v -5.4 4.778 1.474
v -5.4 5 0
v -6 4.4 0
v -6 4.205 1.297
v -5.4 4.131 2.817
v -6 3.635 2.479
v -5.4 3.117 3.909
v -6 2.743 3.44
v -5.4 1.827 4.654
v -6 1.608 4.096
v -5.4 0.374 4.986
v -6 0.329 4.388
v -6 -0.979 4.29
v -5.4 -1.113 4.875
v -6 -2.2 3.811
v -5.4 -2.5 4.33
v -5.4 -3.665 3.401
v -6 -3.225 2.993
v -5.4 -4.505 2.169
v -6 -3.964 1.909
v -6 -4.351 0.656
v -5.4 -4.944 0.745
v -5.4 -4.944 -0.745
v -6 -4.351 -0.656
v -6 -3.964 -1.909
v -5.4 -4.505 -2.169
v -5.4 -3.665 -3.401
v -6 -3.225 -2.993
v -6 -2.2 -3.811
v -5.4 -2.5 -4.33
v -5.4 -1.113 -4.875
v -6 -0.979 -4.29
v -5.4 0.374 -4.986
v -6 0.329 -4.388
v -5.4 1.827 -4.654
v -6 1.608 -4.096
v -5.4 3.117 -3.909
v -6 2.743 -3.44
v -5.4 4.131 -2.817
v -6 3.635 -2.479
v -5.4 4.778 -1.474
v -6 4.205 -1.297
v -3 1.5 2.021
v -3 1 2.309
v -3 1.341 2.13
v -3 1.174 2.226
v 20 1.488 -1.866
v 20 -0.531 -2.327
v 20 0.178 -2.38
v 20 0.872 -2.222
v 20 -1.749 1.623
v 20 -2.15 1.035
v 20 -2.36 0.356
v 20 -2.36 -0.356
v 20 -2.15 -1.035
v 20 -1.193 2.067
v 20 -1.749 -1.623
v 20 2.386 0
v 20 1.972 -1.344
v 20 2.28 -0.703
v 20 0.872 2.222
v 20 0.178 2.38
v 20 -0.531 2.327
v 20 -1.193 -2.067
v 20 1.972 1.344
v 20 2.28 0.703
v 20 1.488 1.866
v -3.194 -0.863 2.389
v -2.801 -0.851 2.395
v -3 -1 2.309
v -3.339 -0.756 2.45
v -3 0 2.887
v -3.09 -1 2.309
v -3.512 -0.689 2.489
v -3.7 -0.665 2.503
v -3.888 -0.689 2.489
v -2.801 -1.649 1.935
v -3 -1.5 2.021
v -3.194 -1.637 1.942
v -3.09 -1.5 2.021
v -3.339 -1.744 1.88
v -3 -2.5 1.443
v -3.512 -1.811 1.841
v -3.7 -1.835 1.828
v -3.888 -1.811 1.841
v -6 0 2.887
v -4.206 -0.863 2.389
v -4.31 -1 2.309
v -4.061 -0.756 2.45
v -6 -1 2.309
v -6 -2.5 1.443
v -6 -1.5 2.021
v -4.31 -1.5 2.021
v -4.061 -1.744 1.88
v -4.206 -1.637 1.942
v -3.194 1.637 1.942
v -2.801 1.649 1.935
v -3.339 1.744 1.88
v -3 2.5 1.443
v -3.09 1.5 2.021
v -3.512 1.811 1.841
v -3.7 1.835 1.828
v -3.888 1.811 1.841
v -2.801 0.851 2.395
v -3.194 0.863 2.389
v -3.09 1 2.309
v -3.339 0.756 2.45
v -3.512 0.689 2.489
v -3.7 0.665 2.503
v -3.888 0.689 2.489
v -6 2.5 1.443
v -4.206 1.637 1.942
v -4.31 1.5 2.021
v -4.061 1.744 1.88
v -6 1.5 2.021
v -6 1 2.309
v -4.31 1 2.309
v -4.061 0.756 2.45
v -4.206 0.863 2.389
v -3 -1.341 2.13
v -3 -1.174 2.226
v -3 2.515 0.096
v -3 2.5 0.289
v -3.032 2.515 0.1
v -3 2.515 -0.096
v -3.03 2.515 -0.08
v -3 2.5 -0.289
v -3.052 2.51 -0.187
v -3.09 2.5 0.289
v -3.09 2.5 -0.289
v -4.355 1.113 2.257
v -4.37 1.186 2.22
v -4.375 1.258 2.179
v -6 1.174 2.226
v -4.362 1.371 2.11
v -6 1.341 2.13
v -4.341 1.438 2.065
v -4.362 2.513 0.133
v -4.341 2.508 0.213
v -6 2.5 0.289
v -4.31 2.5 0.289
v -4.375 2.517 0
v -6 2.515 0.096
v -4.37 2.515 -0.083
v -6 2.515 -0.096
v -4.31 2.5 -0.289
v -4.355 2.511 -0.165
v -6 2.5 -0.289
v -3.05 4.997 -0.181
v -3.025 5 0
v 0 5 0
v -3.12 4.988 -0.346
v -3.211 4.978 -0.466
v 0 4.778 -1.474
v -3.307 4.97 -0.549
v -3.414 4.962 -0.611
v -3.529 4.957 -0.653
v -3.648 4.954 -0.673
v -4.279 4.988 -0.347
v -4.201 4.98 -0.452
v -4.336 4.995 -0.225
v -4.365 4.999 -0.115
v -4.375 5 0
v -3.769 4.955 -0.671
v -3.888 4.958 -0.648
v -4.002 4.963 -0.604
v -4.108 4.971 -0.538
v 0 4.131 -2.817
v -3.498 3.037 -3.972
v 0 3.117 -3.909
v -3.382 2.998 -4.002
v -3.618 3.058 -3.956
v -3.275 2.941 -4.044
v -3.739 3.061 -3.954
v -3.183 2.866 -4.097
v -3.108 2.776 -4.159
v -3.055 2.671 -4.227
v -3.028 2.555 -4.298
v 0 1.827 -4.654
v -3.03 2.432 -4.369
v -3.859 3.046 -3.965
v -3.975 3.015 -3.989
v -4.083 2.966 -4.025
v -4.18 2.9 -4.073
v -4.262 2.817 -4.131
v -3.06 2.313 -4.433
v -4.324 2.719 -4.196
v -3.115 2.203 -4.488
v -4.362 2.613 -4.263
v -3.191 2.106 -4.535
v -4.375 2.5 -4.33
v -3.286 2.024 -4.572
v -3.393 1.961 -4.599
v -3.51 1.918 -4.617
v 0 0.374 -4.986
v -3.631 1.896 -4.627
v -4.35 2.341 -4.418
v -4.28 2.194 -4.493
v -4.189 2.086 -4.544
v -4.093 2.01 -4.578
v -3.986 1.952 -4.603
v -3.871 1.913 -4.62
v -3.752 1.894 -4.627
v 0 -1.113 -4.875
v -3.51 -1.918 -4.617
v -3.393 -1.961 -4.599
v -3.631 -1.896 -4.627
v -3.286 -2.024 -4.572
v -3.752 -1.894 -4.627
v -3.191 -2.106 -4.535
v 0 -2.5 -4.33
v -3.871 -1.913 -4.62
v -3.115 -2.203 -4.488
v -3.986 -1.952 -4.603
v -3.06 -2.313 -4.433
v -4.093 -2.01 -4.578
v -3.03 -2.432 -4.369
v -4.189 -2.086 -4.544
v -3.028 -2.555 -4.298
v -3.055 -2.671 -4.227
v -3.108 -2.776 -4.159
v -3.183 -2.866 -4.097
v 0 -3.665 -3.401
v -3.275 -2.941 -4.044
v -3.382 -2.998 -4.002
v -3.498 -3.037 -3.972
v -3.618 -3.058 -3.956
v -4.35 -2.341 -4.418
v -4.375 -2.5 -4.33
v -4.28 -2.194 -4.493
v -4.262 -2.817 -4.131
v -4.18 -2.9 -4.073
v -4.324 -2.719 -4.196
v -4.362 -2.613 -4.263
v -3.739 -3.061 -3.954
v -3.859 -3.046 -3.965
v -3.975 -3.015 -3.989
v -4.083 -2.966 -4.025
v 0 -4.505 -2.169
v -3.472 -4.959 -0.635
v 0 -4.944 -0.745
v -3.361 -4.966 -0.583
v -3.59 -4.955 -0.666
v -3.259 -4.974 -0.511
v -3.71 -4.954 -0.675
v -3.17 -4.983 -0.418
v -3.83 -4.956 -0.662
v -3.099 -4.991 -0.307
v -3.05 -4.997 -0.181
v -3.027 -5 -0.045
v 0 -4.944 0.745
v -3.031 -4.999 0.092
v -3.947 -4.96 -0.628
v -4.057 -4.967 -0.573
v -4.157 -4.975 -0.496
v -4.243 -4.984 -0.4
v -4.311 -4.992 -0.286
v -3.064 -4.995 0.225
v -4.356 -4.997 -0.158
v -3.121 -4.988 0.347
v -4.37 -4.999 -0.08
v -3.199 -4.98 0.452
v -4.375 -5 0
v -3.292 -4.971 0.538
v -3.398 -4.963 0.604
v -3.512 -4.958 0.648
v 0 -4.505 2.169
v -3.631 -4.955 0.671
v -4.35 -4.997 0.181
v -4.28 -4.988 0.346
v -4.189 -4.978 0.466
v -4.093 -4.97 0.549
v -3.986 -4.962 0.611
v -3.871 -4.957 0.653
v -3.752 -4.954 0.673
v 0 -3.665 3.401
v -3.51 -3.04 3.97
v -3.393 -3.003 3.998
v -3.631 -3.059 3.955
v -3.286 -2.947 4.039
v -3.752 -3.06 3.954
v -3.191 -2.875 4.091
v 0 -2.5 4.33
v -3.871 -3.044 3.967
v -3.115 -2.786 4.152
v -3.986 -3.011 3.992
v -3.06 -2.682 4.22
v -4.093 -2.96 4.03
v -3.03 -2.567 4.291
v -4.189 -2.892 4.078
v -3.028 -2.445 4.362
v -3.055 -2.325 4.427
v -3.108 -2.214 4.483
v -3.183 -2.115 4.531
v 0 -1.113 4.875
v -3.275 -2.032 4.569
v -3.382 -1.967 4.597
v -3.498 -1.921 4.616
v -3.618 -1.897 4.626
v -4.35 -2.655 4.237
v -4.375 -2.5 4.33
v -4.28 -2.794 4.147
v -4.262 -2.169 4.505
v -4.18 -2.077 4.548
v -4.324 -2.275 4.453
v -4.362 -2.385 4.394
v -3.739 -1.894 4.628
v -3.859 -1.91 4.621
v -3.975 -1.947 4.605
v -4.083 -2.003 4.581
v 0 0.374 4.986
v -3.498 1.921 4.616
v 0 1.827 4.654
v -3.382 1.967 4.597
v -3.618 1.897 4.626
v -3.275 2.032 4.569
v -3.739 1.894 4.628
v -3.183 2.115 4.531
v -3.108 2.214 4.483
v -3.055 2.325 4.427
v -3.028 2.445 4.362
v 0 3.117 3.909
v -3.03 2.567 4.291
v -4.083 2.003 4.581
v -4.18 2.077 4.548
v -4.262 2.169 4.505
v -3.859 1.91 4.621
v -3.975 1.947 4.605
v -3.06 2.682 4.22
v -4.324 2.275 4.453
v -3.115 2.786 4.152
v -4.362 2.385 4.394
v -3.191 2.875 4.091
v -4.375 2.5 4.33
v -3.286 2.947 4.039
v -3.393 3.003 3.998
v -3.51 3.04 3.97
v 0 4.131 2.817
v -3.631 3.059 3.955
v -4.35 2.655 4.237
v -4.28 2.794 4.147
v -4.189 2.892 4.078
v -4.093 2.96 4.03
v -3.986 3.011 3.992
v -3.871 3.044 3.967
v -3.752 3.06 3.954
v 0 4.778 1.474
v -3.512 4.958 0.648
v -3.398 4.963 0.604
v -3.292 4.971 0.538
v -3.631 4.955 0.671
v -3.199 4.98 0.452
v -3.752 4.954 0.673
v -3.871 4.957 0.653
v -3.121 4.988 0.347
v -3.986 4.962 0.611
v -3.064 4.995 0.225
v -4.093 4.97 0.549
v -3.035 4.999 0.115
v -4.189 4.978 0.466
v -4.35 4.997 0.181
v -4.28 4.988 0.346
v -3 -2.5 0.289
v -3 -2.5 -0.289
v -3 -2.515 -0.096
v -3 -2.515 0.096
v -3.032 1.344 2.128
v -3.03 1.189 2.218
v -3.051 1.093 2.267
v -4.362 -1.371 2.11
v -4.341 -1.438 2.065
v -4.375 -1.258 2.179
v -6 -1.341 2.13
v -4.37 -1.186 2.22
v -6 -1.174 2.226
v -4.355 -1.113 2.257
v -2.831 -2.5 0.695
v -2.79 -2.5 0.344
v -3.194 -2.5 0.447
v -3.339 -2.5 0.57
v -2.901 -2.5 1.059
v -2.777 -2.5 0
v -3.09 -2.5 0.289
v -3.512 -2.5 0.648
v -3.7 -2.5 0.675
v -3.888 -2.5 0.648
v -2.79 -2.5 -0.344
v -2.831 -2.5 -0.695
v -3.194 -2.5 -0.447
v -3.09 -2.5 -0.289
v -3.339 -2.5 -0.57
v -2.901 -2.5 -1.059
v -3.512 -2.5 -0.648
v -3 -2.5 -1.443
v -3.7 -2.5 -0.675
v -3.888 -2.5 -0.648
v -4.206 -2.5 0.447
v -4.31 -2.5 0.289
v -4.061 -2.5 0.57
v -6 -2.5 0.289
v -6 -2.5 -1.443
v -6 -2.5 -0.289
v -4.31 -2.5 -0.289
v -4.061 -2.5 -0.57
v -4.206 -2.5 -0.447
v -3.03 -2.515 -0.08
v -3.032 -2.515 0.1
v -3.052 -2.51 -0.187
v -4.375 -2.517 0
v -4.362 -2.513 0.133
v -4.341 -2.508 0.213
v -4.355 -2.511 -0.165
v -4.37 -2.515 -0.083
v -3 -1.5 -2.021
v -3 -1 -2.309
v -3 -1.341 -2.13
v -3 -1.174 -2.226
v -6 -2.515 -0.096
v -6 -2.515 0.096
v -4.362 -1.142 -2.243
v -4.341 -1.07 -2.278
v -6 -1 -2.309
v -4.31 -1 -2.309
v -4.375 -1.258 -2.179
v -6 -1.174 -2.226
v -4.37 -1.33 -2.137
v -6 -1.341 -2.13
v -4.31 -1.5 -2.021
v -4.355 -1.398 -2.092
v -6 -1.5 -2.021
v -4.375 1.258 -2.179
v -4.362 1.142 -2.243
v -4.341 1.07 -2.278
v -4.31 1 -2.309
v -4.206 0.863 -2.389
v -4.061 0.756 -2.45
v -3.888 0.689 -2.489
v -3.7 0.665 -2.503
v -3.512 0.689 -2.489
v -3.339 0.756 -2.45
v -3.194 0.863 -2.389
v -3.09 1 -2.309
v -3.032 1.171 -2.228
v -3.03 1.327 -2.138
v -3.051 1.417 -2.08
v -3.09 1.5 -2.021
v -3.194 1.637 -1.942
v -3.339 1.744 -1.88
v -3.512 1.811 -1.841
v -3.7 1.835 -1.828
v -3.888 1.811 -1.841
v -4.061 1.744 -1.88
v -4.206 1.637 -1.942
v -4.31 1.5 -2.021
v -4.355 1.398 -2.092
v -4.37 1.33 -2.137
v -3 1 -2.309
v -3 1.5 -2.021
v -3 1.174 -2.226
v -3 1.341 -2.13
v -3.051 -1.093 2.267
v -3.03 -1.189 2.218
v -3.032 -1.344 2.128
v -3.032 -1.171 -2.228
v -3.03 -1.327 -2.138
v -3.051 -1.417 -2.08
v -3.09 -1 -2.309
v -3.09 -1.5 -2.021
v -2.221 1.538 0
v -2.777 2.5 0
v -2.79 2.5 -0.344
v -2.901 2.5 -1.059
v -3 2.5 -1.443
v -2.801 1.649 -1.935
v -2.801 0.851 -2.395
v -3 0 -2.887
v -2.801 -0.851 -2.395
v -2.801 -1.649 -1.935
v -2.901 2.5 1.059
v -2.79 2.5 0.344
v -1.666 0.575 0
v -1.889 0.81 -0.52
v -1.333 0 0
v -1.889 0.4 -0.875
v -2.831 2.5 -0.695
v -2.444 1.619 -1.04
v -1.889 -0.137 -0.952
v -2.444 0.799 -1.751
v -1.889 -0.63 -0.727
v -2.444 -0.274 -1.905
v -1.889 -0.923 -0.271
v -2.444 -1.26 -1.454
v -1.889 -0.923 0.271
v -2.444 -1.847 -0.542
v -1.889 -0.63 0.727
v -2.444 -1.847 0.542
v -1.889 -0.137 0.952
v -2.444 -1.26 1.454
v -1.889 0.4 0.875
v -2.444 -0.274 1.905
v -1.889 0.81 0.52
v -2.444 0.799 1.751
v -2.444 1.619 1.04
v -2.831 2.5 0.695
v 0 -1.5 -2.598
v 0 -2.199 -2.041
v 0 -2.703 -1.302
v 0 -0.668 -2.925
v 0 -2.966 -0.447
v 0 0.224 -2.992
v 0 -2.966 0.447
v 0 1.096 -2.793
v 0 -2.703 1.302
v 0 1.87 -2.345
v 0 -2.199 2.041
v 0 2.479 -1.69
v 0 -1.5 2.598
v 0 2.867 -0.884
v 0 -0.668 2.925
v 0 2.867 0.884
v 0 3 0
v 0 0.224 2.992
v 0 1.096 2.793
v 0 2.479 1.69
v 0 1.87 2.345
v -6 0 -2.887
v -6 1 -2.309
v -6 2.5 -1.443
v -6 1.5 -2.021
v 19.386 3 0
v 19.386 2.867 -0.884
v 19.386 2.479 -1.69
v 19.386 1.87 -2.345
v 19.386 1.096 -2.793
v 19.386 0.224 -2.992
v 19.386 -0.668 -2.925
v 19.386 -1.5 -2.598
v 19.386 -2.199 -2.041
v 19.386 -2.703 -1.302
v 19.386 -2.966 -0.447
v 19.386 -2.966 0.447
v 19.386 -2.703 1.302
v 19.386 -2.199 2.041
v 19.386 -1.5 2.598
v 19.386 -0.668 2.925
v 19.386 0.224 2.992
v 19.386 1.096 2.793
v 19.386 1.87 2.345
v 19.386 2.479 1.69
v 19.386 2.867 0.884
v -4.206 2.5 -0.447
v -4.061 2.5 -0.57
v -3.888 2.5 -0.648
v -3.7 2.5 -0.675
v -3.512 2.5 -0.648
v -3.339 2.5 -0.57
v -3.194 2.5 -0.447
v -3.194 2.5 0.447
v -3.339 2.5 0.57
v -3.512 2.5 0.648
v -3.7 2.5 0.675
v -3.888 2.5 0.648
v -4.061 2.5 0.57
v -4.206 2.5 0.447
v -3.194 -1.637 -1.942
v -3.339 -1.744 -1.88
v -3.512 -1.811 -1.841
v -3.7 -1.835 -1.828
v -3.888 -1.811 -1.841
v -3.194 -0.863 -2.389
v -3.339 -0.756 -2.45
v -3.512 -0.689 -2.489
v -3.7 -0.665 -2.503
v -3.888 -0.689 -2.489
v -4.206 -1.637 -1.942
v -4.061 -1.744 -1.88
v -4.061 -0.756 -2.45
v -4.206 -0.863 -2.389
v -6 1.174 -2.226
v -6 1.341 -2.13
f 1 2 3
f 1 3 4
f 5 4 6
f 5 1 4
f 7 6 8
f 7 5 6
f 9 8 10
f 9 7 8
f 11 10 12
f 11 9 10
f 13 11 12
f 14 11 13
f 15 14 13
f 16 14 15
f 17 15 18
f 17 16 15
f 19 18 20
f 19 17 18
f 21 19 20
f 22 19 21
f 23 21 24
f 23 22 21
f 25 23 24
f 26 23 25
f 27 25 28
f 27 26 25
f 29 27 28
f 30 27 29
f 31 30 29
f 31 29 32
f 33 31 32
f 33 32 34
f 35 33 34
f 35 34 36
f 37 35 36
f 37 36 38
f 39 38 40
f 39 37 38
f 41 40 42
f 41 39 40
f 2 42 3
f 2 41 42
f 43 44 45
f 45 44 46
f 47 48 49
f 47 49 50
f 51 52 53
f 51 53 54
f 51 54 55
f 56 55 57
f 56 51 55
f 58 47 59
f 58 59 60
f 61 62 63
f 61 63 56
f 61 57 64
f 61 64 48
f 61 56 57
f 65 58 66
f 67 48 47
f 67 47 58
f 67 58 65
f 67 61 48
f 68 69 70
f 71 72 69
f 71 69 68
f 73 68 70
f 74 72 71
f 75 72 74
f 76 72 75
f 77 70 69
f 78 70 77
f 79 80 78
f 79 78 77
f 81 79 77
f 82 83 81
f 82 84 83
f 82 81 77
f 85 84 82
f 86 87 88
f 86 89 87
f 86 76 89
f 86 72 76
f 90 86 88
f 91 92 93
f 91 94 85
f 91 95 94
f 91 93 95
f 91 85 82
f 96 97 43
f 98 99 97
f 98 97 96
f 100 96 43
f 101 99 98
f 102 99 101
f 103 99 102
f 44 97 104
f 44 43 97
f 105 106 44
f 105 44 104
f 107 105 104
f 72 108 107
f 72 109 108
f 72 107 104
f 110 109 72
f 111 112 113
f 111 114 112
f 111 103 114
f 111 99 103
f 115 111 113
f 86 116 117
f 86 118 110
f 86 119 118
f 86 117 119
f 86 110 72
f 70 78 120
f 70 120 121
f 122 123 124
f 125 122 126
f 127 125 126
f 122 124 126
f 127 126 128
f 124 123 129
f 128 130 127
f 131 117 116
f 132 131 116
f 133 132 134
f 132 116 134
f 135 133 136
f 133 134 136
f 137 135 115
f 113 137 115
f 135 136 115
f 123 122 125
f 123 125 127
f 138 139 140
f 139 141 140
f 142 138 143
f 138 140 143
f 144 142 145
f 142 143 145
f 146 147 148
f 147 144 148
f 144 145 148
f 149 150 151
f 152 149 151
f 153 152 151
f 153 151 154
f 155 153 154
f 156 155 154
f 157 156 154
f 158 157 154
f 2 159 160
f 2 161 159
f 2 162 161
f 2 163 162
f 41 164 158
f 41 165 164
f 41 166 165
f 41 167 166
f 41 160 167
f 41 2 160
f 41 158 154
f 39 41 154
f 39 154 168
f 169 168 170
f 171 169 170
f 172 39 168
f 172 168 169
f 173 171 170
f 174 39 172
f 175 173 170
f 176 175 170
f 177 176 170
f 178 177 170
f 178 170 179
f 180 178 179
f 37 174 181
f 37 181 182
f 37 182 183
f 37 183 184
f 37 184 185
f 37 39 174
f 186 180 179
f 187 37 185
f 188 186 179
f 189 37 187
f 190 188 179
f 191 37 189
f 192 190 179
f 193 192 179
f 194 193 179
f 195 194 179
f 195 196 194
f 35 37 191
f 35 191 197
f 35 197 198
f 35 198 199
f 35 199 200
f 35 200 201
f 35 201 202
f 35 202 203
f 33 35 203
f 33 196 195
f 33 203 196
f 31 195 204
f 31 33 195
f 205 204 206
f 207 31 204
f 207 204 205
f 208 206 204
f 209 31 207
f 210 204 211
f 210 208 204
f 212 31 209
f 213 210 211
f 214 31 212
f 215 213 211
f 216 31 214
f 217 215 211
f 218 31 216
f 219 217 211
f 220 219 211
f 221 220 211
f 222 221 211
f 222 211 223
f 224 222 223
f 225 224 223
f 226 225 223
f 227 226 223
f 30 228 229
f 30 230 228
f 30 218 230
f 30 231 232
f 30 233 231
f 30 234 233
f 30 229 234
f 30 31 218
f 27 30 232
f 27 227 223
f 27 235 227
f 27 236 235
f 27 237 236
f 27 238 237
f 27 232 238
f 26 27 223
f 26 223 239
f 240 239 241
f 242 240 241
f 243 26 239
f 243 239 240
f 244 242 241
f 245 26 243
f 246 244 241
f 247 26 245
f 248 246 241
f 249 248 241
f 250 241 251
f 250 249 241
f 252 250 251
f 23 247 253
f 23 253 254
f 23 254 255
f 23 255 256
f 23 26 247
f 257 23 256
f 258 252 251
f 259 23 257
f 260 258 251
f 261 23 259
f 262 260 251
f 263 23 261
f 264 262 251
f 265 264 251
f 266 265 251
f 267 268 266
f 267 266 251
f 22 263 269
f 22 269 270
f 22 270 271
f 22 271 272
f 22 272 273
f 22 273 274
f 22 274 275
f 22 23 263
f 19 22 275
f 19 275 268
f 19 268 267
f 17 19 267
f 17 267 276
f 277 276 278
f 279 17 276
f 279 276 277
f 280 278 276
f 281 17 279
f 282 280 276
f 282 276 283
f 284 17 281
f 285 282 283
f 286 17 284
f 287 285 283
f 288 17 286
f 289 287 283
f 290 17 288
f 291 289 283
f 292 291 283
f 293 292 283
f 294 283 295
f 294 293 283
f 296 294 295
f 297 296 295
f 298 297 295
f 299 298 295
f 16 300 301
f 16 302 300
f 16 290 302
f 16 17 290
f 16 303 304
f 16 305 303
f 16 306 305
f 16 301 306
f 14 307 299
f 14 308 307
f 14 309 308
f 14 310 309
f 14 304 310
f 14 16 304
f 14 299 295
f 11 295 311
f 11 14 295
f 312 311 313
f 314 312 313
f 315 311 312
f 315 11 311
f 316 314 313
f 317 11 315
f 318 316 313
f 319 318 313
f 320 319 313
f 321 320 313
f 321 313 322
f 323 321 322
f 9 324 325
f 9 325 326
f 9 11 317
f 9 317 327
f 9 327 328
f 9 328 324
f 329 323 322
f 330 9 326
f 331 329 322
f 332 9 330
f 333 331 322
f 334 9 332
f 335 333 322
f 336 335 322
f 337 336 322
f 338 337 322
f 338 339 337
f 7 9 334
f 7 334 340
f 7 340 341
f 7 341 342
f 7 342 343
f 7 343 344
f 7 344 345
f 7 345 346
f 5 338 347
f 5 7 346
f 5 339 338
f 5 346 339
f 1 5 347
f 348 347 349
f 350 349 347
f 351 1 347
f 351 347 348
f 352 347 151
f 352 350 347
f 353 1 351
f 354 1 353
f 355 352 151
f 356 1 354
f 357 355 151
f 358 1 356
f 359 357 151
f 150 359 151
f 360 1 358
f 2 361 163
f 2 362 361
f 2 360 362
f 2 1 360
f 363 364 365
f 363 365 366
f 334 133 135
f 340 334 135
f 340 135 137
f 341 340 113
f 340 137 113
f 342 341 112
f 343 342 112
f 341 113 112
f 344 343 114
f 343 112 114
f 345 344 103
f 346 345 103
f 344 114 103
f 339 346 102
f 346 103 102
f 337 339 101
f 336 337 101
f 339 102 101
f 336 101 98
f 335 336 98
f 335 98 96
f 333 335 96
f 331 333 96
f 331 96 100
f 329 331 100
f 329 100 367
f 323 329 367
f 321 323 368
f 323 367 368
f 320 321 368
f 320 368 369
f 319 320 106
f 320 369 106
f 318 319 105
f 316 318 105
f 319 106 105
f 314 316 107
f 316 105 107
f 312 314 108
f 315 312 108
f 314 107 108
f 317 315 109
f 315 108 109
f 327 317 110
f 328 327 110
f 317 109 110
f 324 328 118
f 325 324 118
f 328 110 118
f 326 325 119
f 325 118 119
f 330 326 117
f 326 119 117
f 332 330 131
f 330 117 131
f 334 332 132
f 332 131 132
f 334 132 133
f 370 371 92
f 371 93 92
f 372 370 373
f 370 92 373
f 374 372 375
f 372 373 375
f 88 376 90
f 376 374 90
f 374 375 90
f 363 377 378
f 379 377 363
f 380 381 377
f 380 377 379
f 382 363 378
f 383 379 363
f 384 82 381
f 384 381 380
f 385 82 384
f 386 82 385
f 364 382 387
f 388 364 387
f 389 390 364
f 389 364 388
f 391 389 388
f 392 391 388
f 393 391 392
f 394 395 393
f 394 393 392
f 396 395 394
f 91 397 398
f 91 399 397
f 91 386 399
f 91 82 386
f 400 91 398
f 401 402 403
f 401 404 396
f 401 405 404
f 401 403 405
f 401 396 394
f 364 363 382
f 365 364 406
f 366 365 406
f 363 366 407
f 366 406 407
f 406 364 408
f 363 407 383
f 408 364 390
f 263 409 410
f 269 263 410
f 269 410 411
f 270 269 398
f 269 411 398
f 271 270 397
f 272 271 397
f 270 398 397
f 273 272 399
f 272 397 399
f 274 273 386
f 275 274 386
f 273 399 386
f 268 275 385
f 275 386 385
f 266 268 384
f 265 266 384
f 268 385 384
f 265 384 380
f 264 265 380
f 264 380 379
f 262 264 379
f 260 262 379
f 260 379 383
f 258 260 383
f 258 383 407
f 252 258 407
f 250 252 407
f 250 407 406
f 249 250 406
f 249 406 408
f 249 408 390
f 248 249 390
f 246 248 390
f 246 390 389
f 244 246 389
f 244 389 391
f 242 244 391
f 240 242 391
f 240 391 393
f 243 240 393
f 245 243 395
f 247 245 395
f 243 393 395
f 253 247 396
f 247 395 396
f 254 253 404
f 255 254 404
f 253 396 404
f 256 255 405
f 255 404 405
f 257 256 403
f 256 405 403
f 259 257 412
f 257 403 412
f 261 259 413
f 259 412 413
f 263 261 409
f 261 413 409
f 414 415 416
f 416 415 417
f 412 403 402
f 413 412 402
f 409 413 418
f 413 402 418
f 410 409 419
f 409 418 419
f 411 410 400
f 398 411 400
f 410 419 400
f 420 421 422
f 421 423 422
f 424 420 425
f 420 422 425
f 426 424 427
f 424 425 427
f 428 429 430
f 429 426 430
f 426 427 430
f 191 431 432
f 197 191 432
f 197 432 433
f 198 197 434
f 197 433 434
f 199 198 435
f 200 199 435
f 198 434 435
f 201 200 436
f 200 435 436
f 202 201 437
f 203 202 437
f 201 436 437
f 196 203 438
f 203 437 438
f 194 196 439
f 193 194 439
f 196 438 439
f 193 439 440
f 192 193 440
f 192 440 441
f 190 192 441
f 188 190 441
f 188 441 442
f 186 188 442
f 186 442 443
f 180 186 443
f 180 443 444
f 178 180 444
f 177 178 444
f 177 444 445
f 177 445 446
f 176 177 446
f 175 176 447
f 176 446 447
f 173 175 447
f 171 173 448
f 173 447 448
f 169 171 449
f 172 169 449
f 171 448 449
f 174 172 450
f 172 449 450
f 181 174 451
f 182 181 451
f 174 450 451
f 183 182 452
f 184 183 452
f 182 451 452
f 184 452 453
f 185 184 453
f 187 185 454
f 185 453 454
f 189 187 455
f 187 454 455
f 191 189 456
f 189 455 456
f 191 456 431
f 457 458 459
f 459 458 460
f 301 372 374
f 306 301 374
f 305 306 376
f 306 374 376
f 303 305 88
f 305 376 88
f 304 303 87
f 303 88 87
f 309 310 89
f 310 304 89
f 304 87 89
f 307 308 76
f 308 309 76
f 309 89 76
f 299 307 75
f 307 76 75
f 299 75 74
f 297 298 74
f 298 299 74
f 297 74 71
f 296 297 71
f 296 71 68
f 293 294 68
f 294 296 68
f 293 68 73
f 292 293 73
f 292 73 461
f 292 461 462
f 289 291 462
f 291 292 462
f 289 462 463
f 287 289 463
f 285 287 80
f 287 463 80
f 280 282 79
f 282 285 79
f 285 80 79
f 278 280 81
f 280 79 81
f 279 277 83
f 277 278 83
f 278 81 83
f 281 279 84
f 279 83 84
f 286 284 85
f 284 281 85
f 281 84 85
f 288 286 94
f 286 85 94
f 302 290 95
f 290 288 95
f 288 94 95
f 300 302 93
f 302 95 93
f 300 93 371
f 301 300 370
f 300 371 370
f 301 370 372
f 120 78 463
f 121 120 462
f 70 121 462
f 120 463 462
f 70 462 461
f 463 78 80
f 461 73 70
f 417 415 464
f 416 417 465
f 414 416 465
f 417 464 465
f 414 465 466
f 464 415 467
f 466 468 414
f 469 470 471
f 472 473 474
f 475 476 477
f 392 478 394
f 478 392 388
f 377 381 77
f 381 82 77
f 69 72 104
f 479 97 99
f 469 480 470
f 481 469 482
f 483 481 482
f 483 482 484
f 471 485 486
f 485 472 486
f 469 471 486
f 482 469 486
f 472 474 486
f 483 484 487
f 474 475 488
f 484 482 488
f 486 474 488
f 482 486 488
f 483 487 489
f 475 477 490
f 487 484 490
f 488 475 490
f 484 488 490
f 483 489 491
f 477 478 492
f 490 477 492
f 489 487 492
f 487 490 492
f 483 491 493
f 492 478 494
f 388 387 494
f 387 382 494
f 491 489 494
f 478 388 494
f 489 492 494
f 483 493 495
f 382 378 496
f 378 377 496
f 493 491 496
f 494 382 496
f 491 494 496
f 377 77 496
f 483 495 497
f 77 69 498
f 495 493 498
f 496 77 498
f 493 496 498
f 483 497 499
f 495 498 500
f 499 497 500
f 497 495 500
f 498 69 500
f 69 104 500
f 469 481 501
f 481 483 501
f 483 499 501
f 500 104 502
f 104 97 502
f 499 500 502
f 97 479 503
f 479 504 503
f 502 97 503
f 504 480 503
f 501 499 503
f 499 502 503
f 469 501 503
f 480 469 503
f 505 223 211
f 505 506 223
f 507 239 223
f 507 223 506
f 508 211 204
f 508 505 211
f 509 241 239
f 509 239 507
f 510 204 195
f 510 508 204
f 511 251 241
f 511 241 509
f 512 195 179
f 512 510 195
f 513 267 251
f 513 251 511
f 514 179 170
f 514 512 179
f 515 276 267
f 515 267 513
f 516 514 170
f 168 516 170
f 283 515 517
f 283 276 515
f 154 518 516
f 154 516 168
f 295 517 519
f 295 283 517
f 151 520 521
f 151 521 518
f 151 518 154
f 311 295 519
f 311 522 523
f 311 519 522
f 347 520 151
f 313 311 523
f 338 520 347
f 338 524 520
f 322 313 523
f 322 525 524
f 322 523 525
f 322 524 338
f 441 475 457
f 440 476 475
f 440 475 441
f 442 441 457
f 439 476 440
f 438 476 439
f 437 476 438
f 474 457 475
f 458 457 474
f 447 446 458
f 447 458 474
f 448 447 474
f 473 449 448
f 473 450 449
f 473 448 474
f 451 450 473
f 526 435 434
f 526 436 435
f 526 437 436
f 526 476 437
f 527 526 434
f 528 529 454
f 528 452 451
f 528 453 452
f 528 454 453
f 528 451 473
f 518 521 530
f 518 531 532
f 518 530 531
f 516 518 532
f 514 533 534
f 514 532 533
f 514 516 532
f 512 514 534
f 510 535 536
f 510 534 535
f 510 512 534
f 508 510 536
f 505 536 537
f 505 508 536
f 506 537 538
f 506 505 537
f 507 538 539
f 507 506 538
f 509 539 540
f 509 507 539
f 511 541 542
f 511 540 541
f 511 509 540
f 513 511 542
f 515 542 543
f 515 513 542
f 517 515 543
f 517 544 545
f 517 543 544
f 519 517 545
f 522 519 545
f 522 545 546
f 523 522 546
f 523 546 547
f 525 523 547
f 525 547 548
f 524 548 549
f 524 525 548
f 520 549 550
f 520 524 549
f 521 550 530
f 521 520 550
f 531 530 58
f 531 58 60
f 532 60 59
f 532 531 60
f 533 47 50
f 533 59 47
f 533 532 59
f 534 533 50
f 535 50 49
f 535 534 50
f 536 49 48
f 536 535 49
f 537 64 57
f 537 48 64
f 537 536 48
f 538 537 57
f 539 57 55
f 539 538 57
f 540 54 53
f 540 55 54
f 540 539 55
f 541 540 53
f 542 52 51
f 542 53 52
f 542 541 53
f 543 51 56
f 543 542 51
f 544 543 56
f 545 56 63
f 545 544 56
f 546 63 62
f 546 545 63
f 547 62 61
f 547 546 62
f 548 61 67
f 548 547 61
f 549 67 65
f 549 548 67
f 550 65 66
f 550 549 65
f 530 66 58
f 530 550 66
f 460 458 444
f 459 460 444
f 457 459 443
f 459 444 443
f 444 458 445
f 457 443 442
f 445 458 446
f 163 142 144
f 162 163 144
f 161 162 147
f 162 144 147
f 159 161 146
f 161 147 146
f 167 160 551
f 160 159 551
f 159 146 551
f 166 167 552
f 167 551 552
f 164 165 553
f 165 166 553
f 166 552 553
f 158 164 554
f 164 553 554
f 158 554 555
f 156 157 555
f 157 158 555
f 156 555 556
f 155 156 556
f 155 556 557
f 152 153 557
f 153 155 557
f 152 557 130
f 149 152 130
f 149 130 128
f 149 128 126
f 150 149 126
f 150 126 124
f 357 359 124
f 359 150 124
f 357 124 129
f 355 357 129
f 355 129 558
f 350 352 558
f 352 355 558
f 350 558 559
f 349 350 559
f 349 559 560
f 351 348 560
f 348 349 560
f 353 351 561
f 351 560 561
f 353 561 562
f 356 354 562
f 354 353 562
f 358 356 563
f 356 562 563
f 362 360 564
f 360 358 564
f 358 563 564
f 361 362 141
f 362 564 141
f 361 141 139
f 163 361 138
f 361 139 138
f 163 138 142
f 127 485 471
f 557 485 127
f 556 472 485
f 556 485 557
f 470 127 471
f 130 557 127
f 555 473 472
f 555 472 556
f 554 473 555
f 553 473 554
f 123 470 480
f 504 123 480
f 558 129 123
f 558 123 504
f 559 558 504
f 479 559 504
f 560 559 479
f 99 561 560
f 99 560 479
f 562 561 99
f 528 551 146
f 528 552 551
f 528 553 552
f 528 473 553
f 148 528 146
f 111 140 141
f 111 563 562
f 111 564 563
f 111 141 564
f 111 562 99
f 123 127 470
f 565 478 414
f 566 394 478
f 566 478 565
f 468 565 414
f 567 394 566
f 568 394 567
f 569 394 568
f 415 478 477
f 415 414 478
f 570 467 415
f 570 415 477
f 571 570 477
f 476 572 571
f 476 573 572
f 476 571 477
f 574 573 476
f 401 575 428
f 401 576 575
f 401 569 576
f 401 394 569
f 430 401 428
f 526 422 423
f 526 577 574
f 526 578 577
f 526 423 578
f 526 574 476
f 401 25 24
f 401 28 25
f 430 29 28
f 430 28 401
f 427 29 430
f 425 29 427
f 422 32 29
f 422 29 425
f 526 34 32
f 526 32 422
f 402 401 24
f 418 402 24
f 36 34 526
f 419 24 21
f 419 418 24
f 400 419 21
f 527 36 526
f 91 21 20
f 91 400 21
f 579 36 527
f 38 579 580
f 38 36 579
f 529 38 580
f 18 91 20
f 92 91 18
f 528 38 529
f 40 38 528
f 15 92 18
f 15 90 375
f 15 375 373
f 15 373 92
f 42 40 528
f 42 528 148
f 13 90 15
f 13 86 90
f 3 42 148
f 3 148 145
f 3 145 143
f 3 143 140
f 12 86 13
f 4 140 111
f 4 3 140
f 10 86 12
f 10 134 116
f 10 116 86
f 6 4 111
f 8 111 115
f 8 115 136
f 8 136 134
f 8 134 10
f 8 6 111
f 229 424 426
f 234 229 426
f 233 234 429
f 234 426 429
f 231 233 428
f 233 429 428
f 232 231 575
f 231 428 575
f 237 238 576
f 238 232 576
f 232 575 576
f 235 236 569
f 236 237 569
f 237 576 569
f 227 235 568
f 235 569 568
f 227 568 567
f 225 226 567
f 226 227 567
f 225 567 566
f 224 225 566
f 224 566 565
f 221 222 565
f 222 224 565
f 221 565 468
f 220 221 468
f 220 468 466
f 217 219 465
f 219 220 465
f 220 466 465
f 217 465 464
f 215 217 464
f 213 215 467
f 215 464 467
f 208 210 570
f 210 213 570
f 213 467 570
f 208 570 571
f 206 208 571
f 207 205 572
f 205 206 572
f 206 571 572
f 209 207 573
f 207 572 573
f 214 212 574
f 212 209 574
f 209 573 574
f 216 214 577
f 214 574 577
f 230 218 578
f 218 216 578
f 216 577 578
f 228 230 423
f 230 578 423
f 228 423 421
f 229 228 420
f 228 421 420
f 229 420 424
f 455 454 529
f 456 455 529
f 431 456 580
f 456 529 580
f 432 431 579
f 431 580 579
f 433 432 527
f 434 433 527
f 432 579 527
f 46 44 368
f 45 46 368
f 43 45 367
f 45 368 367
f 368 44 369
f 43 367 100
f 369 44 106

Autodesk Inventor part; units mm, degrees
ref_plane "YZ Plane" through (0, 0, 0) normal (1, 0, 0) x (0, 1, 0)
ref_plane "XZ Plane" through (0, 0, 0) normal (0, 1, 0) x (-1, 0, 0)
sketch "Sketch1" plane through (0, 0, 0) normal (0, 0, 1) x (1, 0, 0)
  line L0 (-1.3333, 0) -> (20, 0)
  line L1 (20, 0) -> (20, 3)
  line L2 (20, 3) -> (0, 3)
  line L3 (0, 3) -> (0, 5)
  line L4 (0, 5) -> (-6, 5)
  line L5 (-6, 5) -> (-6, 2.8868)
  line L6 (-6, 2.8868) -> (-3, 2.8868)
  line L7 (-3, 2.8868) -> (-1.3333, 0)
  line L8 (-11.2, 0) -> (25.2, 0) projected
  line L9 (0, -1) -> (0, 6) projected
  dimension "d3" = 6
  dimension "d4" = 3
  dimension "d5" = 60
  dimension "d6" = 6
  dimension "d8" = 5.7735
  dimension "d9" = 10
  dimension "d31" = 20
revolve "Body" add sketch "Sketch1" angle 360 about axis through (-1.3333, 0, 0) along (1, 0, 0)
sketch "Sketch2" plane through (-6, 0, 0) normal (-1, 0, 0) x (0, 0, 1)
  circle A0 centre (0, 0) radius 2.8868 projected
  line L0 (0, -7) -> (0, 7) projected
  line L1 (-7, 0) -> (7, 0) projected
  line L2 (2.8868, 0) -> (1.4434, -2.5)
  line L3 (1.4434, -2.5) -> (-1.4434, -2.5)
  line L4 (-1.4434, -2.5) -> (-2.8868, 0)
  line L5 (-2.8868, 0) -> (-1.4434, 2.5)
  line L6 (-1.4434, 2.5) -> (1.4434, 2.5)
  line L7 (1.4434, 2.5) -> (2.8868, 0)
extrude "Slot" add sketch "Sketch2" against normal up to next contours L7 A0 | A0 L2 | L6 L0 A0 | A0 L0 L3 | L0 L6 A0 | A0 L3 L0 | L4 A0 | A0 L5
sketch "Sketch3" plane through (-6, 0, 0) normal (-1, 0, 0) x (0, 0, 1)
  circle A0 centre (0, 0) radius 5 projected
  line L0 (-1.4434, 2.5) -> (1.4434, 2.5) projected
  circle A1 centre (0, 0) radius 2.5166
  point P0 (-0.2887, 2.5)
  point P1 (0.2887, 2.5)
  dimension "d23" = 0.5774
extrude "Overcut" cut sketch "Sketch3" against normal blind 3 contours A1 L0 | L0 A1
sketch "Sketch4" plane through (0, 0, 0) normal (0, 1, 0) x (-1, 0, 0)
  line L0 (0, 5) -> (0, -5) projected
  line L1 (7.2, 0) -> (-1.2, 0) projected
  circle A0 centre (3.7, 0) radius 0.675
  line L2 (6, 5) -> (6, -5) projected
  point P0 (0, 0)
  dimension "d13" = 1.35
  dimension "d14" = 2.3
extrude "Hole" cut sketch "Sketch4" along normal through all both and the other way through all
pattern_circular "Holes" count 3 over 360 about axis through (10, 0, 0) along (1, 0, 0) of "Hole"
chamfer "Chamfer1" distance 0.6 angle 45 1 edges at (-6, -5, 0) measured on face at (-3.2045, -4.6671, -1.794)
thread "Thread" size "M6x1" class "6g" standard "ISO Metric profile" length 18.7731
chamfer "Chamfer2" distance 0.6135 distance2 0.6135 1 edges at (20, -3, 0) measured on face at (20, 1.0659, 1.0214)
ref_plane "Work Plane1" through (10, 0, 0) normal (0, 0.5, 0.866) x (1, 0, 0)
equation "\"d3\" = KOH"
equation "\"d4\" = STI"
equation "\"d6\" = GD"
equation "\"d8\" = 1.1547 * SW"
equation "\"d9\" = KOD"
equation "\"d31\" = NLG"
equation "\"d23\" = 0.11547 * SW"
equation "\"d24\" = STI"
equation "\"d13\" = BOR"
equation "\"d14\" = DIST"
equation "\"d17\" = PHH"
equation "\"d32\" = PHH"
equation "\"d19\" = GEL"
equation "\"d21\" = -0.5 * SPD + 0.5 * GD"
equation "\"d22\" = GUL"
equation "\"GD\" = NND"
equation "\"NLG\" = 20"
equation "\"GEL\" = 18.7731"
equation "\"KOD\" = 10"
equation "\"KOH\" = 6"
equation "\"GUL\" = 0.61345 * PTC"
equation "\"SW\" = 5"
equation "\"STI\" = 3"
equation "\"DIST\" = 2.3"
equation "\"BOR\" = 1.35"
equation "\"PHH\" = 0.6"
equation "\"SPD\" = 4.7731"
equation "\"PTC\" = 1"
equation "\"THREADDIA\" = 6"
equation "\"TOA\" = 30deg"
equation "\"BDM\" = NND"
equation "\"NND\" = 6"
equation "\"E0\" = 1.155 * SW"
equation "\"GAL\" = 0.61345 * PTC"
equation "\"GD1\" = THREADDIA - 1.2269 * PTC"
properties part number "ANSI B18.3.1M - M6x1 x 20" material "Steel, Mild"
